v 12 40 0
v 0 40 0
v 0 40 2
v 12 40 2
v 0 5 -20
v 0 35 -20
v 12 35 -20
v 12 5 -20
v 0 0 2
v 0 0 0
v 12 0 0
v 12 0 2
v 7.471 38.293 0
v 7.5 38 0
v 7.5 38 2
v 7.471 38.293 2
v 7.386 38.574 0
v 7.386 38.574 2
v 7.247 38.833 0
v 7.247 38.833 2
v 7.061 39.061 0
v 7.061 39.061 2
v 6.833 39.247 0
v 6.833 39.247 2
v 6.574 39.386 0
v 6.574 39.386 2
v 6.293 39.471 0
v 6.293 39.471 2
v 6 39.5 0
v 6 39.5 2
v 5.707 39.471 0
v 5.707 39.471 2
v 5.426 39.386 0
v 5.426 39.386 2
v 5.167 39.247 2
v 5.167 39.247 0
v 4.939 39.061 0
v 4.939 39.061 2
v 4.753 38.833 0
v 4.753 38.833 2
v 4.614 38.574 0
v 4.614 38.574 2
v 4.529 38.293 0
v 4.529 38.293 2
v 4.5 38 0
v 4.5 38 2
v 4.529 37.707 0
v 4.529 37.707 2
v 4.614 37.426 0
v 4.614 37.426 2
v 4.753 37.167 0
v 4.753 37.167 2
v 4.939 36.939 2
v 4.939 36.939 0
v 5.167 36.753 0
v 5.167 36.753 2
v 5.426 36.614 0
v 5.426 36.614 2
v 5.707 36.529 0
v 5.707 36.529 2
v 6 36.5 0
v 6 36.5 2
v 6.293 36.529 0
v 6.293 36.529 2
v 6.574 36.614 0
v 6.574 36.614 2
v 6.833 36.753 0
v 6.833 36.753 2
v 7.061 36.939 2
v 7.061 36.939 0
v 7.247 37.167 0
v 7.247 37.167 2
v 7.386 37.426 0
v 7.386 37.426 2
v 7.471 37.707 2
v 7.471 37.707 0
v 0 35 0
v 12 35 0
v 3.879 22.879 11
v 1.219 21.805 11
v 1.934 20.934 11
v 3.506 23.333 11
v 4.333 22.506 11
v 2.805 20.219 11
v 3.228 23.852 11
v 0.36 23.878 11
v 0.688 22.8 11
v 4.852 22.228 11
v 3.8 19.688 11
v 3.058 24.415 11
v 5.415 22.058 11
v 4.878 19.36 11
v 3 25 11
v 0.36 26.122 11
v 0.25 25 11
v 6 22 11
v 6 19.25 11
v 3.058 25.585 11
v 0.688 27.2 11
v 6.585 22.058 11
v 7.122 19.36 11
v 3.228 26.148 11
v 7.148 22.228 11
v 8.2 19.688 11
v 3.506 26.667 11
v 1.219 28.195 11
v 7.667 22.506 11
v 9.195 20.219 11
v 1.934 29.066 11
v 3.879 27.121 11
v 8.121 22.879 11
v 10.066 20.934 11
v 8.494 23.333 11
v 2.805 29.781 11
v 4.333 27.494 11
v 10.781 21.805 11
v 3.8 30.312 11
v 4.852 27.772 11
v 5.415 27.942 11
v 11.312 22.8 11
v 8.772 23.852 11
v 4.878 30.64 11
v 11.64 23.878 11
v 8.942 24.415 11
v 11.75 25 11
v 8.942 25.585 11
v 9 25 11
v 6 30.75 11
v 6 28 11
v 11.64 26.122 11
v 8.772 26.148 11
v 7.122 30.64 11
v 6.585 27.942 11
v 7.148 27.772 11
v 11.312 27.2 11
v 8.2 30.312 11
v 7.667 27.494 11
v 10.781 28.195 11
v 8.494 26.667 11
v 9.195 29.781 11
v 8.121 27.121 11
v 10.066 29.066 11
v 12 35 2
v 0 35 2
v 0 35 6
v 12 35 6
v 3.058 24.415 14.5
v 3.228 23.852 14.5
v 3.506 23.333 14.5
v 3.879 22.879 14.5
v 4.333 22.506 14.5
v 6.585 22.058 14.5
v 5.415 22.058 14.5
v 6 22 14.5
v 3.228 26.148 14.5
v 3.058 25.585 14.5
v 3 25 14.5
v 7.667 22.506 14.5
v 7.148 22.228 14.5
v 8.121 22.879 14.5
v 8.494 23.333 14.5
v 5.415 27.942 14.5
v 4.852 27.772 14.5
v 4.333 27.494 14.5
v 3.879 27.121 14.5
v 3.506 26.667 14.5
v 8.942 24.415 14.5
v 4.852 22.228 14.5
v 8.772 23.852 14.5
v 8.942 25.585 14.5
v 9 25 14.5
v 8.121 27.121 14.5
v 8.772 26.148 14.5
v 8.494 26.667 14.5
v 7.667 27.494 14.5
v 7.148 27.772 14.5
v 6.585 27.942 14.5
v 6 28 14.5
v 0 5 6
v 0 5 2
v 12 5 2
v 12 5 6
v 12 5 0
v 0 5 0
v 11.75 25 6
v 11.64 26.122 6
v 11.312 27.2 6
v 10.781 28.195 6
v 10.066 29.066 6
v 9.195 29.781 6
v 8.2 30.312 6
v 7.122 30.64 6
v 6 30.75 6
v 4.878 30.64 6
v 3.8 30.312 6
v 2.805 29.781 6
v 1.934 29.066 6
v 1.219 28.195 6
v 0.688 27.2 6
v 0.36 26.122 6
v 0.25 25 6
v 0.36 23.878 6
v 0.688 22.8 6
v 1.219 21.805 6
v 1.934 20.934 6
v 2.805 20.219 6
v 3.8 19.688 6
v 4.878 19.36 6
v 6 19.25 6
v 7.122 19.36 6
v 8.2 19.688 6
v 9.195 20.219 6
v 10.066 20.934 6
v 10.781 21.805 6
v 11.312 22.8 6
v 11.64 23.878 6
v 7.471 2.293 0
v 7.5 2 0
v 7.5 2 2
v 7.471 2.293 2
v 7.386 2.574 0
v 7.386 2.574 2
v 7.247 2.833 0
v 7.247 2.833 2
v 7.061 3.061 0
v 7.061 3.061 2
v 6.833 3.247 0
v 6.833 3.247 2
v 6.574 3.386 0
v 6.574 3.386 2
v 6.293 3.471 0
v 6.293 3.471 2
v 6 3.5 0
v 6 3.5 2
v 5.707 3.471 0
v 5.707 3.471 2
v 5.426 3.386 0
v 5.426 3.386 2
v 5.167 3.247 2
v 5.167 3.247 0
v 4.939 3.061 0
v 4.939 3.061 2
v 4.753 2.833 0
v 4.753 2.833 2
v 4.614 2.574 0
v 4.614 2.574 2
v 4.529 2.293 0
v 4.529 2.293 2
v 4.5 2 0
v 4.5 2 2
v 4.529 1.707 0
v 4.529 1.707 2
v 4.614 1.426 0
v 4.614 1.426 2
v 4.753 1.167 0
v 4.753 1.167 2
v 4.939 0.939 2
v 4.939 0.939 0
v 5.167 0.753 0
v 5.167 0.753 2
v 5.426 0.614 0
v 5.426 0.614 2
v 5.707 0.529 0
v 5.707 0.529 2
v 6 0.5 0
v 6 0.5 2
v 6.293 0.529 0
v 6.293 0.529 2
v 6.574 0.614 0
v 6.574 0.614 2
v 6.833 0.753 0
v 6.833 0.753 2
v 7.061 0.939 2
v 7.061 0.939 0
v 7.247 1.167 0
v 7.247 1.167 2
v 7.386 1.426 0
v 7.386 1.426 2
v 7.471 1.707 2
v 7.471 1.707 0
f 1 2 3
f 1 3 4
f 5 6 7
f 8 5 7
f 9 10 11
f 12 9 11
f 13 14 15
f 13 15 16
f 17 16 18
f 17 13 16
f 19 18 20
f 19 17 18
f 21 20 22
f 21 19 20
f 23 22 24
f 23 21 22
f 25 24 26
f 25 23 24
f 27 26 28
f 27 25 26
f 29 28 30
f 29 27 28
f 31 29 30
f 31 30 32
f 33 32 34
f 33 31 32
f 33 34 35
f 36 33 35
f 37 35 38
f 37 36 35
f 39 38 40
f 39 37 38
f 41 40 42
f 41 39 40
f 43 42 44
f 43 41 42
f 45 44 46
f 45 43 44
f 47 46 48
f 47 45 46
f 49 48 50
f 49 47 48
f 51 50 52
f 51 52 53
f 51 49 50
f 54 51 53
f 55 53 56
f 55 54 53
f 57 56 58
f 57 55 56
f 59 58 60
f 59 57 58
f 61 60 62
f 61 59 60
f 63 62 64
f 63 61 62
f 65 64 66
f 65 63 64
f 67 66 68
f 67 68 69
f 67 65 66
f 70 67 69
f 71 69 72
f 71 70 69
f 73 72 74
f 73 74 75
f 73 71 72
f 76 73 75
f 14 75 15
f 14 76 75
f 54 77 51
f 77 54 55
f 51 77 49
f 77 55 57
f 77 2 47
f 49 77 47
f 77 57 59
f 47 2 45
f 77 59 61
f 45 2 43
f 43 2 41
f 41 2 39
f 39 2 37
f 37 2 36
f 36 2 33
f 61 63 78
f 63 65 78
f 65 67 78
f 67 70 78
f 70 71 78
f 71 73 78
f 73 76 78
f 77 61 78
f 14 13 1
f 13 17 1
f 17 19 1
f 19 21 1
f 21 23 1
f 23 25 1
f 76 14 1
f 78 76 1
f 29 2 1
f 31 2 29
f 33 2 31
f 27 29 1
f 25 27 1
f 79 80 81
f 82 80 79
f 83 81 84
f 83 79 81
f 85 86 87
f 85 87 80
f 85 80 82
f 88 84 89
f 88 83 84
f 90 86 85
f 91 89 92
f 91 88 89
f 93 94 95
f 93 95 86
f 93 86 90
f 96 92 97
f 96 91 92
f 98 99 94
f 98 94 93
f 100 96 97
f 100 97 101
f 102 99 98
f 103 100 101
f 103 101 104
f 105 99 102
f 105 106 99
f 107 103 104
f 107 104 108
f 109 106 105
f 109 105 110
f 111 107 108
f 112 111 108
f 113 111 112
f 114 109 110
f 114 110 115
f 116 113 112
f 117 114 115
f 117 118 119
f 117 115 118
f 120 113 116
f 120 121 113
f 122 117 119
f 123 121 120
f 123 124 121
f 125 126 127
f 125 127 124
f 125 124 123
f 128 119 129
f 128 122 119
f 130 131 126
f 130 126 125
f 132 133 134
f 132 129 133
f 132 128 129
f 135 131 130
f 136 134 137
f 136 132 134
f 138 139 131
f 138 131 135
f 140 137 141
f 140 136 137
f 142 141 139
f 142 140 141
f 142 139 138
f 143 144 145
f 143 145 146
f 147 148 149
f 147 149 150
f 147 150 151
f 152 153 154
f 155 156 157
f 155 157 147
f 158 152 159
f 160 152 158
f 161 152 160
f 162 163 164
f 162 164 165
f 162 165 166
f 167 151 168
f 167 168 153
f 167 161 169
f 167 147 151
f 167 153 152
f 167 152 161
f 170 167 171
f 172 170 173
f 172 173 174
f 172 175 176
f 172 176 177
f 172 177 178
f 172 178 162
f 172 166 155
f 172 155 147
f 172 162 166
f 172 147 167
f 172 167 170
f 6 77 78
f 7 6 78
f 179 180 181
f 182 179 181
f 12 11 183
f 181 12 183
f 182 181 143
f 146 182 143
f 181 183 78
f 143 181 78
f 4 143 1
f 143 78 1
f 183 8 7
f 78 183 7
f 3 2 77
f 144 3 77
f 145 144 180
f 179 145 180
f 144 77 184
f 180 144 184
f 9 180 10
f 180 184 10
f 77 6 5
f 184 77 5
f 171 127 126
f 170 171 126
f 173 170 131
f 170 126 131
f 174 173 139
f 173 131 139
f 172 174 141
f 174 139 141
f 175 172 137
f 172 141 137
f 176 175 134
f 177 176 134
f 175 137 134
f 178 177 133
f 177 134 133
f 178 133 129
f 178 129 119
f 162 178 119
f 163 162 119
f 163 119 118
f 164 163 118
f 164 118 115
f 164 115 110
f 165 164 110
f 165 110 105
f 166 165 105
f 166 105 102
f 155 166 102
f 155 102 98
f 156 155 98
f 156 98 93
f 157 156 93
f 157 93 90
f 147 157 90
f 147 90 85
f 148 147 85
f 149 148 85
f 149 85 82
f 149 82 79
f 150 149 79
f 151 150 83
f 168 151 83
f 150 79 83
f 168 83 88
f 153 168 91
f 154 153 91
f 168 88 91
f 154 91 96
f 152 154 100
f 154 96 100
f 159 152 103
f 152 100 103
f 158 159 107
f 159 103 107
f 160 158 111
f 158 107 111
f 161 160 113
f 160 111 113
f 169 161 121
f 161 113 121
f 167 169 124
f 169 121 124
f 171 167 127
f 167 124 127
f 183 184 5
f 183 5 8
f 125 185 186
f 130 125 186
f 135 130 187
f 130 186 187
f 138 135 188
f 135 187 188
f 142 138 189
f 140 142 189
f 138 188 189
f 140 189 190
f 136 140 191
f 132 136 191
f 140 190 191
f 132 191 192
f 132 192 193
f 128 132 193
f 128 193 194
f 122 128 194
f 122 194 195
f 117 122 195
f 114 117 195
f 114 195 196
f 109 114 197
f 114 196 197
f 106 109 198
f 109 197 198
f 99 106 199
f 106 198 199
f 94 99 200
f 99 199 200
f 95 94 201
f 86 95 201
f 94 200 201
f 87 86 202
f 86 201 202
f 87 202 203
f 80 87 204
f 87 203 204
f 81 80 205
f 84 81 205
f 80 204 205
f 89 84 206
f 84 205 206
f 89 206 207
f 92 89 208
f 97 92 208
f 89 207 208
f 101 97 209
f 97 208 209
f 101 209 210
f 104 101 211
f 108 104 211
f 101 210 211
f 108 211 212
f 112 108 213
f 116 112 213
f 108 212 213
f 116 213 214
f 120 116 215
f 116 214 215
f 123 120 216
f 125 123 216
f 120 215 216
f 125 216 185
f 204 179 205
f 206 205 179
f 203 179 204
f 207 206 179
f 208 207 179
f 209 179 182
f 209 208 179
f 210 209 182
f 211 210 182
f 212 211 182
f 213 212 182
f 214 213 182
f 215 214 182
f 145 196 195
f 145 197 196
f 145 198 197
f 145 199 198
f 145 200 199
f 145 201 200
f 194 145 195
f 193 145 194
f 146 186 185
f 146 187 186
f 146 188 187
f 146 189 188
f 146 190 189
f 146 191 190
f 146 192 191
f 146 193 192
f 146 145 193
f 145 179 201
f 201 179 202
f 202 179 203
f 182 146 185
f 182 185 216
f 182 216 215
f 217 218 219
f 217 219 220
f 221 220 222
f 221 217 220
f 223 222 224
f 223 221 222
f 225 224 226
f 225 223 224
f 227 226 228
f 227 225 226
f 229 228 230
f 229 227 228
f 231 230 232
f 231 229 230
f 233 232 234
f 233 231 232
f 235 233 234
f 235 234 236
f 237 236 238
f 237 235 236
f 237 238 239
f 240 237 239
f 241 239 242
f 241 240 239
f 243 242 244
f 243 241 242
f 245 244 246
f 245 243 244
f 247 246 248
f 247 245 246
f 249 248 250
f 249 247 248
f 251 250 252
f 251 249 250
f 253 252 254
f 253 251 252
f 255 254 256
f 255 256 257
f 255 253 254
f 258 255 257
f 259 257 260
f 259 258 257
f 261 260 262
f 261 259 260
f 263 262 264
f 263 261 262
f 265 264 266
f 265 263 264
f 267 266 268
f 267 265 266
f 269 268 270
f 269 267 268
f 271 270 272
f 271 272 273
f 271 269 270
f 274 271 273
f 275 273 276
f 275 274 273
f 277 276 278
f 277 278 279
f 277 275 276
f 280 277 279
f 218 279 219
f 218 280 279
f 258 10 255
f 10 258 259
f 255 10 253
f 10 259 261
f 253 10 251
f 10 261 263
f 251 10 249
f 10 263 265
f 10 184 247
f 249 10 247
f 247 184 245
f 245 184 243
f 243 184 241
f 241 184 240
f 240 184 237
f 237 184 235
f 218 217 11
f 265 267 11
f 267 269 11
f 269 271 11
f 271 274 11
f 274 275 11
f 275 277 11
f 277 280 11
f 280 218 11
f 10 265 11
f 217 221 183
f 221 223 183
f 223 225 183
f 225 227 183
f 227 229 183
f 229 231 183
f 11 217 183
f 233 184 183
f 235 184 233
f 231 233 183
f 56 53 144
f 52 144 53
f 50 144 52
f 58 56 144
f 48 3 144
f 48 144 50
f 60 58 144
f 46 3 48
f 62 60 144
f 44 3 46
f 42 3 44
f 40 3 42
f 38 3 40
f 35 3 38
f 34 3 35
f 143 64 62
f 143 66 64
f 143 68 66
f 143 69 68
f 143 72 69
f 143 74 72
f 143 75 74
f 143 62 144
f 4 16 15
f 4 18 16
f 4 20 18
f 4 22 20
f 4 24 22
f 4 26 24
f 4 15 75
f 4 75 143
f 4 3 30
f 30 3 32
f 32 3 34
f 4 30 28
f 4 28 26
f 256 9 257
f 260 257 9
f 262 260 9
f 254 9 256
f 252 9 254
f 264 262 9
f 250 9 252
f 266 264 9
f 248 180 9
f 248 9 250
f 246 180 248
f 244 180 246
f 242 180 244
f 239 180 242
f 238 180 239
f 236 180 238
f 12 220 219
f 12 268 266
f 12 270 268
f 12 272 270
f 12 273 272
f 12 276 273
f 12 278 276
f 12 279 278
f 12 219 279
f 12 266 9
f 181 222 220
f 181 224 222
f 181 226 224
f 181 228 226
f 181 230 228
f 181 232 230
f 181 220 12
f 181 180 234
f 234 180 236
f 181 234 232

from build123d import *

# Parameters (mm, degrees)
F0_W     = 12
F0_H     = 5
F0_R     = 1.5
F0_H_2   = 30
F1_DEPTH = 2
F2_DEPTH = 6
F3_DEPTH = 20
F4_R     = 3
F5_DEPTH = 8.5
F4_R_2   = 5.75
F6_DEPTH = 5


with BuildPart() as f1:
    # F0 (on Top) → F1 (new body)
    with BuildSketch(Plane.XY):
        with Locations((6, 37.5)):
            Rectangle(F0_W, F0_H)
        with Locations((6, 38)):
            Circle(F0_R, mode=Mode.SUBTRACT)
        with Locations((6, 20)):
            Rectangle(F0_W, F0_H_2)
        with Locations((6, 2.5)):
            Rectangle(F0_W, F0_H)
        with Locations((6, 2)):
            Circle(F0_R, mode=Mode.SUBTRACT)
    extrude(amount=F1_DEPTH)

    # F0 (on Top) → F2 (join)
    with BuildSketch(Plane.XY):
        with Locations((6, 20)):
            Rectangle(F0_W, F0_H_2)
    extrude(amount=F2_DEPTH)

    # F0 (on Top) → F3 (join)
    with BuildSketch(Plane.XY):
        with Locations((6, 20)):
            Rectangle(F0_W, F0_H_2)
    extrude(amount=-F3_DEPTH)

    # F4 (on face) → F5 (join)
    with BuildSketch(Plane.XY.offset(6)):
        with Locations((6, 25)):
            Circle(F4_R)
    extrude(amount=F5_DEPTH)

    # F4 (on face) → F6 (join)
    with BuildSketch(Plane.XY.offset(6)):
        with Locations((6, 25)):
            Circle(F4_R_2)
        with Locations((6, 25)):
            Circle(F4_R, mode=Mode.SUBTRACT)
    extrude(amount=F6_DEPTH)


solid = f1.part
